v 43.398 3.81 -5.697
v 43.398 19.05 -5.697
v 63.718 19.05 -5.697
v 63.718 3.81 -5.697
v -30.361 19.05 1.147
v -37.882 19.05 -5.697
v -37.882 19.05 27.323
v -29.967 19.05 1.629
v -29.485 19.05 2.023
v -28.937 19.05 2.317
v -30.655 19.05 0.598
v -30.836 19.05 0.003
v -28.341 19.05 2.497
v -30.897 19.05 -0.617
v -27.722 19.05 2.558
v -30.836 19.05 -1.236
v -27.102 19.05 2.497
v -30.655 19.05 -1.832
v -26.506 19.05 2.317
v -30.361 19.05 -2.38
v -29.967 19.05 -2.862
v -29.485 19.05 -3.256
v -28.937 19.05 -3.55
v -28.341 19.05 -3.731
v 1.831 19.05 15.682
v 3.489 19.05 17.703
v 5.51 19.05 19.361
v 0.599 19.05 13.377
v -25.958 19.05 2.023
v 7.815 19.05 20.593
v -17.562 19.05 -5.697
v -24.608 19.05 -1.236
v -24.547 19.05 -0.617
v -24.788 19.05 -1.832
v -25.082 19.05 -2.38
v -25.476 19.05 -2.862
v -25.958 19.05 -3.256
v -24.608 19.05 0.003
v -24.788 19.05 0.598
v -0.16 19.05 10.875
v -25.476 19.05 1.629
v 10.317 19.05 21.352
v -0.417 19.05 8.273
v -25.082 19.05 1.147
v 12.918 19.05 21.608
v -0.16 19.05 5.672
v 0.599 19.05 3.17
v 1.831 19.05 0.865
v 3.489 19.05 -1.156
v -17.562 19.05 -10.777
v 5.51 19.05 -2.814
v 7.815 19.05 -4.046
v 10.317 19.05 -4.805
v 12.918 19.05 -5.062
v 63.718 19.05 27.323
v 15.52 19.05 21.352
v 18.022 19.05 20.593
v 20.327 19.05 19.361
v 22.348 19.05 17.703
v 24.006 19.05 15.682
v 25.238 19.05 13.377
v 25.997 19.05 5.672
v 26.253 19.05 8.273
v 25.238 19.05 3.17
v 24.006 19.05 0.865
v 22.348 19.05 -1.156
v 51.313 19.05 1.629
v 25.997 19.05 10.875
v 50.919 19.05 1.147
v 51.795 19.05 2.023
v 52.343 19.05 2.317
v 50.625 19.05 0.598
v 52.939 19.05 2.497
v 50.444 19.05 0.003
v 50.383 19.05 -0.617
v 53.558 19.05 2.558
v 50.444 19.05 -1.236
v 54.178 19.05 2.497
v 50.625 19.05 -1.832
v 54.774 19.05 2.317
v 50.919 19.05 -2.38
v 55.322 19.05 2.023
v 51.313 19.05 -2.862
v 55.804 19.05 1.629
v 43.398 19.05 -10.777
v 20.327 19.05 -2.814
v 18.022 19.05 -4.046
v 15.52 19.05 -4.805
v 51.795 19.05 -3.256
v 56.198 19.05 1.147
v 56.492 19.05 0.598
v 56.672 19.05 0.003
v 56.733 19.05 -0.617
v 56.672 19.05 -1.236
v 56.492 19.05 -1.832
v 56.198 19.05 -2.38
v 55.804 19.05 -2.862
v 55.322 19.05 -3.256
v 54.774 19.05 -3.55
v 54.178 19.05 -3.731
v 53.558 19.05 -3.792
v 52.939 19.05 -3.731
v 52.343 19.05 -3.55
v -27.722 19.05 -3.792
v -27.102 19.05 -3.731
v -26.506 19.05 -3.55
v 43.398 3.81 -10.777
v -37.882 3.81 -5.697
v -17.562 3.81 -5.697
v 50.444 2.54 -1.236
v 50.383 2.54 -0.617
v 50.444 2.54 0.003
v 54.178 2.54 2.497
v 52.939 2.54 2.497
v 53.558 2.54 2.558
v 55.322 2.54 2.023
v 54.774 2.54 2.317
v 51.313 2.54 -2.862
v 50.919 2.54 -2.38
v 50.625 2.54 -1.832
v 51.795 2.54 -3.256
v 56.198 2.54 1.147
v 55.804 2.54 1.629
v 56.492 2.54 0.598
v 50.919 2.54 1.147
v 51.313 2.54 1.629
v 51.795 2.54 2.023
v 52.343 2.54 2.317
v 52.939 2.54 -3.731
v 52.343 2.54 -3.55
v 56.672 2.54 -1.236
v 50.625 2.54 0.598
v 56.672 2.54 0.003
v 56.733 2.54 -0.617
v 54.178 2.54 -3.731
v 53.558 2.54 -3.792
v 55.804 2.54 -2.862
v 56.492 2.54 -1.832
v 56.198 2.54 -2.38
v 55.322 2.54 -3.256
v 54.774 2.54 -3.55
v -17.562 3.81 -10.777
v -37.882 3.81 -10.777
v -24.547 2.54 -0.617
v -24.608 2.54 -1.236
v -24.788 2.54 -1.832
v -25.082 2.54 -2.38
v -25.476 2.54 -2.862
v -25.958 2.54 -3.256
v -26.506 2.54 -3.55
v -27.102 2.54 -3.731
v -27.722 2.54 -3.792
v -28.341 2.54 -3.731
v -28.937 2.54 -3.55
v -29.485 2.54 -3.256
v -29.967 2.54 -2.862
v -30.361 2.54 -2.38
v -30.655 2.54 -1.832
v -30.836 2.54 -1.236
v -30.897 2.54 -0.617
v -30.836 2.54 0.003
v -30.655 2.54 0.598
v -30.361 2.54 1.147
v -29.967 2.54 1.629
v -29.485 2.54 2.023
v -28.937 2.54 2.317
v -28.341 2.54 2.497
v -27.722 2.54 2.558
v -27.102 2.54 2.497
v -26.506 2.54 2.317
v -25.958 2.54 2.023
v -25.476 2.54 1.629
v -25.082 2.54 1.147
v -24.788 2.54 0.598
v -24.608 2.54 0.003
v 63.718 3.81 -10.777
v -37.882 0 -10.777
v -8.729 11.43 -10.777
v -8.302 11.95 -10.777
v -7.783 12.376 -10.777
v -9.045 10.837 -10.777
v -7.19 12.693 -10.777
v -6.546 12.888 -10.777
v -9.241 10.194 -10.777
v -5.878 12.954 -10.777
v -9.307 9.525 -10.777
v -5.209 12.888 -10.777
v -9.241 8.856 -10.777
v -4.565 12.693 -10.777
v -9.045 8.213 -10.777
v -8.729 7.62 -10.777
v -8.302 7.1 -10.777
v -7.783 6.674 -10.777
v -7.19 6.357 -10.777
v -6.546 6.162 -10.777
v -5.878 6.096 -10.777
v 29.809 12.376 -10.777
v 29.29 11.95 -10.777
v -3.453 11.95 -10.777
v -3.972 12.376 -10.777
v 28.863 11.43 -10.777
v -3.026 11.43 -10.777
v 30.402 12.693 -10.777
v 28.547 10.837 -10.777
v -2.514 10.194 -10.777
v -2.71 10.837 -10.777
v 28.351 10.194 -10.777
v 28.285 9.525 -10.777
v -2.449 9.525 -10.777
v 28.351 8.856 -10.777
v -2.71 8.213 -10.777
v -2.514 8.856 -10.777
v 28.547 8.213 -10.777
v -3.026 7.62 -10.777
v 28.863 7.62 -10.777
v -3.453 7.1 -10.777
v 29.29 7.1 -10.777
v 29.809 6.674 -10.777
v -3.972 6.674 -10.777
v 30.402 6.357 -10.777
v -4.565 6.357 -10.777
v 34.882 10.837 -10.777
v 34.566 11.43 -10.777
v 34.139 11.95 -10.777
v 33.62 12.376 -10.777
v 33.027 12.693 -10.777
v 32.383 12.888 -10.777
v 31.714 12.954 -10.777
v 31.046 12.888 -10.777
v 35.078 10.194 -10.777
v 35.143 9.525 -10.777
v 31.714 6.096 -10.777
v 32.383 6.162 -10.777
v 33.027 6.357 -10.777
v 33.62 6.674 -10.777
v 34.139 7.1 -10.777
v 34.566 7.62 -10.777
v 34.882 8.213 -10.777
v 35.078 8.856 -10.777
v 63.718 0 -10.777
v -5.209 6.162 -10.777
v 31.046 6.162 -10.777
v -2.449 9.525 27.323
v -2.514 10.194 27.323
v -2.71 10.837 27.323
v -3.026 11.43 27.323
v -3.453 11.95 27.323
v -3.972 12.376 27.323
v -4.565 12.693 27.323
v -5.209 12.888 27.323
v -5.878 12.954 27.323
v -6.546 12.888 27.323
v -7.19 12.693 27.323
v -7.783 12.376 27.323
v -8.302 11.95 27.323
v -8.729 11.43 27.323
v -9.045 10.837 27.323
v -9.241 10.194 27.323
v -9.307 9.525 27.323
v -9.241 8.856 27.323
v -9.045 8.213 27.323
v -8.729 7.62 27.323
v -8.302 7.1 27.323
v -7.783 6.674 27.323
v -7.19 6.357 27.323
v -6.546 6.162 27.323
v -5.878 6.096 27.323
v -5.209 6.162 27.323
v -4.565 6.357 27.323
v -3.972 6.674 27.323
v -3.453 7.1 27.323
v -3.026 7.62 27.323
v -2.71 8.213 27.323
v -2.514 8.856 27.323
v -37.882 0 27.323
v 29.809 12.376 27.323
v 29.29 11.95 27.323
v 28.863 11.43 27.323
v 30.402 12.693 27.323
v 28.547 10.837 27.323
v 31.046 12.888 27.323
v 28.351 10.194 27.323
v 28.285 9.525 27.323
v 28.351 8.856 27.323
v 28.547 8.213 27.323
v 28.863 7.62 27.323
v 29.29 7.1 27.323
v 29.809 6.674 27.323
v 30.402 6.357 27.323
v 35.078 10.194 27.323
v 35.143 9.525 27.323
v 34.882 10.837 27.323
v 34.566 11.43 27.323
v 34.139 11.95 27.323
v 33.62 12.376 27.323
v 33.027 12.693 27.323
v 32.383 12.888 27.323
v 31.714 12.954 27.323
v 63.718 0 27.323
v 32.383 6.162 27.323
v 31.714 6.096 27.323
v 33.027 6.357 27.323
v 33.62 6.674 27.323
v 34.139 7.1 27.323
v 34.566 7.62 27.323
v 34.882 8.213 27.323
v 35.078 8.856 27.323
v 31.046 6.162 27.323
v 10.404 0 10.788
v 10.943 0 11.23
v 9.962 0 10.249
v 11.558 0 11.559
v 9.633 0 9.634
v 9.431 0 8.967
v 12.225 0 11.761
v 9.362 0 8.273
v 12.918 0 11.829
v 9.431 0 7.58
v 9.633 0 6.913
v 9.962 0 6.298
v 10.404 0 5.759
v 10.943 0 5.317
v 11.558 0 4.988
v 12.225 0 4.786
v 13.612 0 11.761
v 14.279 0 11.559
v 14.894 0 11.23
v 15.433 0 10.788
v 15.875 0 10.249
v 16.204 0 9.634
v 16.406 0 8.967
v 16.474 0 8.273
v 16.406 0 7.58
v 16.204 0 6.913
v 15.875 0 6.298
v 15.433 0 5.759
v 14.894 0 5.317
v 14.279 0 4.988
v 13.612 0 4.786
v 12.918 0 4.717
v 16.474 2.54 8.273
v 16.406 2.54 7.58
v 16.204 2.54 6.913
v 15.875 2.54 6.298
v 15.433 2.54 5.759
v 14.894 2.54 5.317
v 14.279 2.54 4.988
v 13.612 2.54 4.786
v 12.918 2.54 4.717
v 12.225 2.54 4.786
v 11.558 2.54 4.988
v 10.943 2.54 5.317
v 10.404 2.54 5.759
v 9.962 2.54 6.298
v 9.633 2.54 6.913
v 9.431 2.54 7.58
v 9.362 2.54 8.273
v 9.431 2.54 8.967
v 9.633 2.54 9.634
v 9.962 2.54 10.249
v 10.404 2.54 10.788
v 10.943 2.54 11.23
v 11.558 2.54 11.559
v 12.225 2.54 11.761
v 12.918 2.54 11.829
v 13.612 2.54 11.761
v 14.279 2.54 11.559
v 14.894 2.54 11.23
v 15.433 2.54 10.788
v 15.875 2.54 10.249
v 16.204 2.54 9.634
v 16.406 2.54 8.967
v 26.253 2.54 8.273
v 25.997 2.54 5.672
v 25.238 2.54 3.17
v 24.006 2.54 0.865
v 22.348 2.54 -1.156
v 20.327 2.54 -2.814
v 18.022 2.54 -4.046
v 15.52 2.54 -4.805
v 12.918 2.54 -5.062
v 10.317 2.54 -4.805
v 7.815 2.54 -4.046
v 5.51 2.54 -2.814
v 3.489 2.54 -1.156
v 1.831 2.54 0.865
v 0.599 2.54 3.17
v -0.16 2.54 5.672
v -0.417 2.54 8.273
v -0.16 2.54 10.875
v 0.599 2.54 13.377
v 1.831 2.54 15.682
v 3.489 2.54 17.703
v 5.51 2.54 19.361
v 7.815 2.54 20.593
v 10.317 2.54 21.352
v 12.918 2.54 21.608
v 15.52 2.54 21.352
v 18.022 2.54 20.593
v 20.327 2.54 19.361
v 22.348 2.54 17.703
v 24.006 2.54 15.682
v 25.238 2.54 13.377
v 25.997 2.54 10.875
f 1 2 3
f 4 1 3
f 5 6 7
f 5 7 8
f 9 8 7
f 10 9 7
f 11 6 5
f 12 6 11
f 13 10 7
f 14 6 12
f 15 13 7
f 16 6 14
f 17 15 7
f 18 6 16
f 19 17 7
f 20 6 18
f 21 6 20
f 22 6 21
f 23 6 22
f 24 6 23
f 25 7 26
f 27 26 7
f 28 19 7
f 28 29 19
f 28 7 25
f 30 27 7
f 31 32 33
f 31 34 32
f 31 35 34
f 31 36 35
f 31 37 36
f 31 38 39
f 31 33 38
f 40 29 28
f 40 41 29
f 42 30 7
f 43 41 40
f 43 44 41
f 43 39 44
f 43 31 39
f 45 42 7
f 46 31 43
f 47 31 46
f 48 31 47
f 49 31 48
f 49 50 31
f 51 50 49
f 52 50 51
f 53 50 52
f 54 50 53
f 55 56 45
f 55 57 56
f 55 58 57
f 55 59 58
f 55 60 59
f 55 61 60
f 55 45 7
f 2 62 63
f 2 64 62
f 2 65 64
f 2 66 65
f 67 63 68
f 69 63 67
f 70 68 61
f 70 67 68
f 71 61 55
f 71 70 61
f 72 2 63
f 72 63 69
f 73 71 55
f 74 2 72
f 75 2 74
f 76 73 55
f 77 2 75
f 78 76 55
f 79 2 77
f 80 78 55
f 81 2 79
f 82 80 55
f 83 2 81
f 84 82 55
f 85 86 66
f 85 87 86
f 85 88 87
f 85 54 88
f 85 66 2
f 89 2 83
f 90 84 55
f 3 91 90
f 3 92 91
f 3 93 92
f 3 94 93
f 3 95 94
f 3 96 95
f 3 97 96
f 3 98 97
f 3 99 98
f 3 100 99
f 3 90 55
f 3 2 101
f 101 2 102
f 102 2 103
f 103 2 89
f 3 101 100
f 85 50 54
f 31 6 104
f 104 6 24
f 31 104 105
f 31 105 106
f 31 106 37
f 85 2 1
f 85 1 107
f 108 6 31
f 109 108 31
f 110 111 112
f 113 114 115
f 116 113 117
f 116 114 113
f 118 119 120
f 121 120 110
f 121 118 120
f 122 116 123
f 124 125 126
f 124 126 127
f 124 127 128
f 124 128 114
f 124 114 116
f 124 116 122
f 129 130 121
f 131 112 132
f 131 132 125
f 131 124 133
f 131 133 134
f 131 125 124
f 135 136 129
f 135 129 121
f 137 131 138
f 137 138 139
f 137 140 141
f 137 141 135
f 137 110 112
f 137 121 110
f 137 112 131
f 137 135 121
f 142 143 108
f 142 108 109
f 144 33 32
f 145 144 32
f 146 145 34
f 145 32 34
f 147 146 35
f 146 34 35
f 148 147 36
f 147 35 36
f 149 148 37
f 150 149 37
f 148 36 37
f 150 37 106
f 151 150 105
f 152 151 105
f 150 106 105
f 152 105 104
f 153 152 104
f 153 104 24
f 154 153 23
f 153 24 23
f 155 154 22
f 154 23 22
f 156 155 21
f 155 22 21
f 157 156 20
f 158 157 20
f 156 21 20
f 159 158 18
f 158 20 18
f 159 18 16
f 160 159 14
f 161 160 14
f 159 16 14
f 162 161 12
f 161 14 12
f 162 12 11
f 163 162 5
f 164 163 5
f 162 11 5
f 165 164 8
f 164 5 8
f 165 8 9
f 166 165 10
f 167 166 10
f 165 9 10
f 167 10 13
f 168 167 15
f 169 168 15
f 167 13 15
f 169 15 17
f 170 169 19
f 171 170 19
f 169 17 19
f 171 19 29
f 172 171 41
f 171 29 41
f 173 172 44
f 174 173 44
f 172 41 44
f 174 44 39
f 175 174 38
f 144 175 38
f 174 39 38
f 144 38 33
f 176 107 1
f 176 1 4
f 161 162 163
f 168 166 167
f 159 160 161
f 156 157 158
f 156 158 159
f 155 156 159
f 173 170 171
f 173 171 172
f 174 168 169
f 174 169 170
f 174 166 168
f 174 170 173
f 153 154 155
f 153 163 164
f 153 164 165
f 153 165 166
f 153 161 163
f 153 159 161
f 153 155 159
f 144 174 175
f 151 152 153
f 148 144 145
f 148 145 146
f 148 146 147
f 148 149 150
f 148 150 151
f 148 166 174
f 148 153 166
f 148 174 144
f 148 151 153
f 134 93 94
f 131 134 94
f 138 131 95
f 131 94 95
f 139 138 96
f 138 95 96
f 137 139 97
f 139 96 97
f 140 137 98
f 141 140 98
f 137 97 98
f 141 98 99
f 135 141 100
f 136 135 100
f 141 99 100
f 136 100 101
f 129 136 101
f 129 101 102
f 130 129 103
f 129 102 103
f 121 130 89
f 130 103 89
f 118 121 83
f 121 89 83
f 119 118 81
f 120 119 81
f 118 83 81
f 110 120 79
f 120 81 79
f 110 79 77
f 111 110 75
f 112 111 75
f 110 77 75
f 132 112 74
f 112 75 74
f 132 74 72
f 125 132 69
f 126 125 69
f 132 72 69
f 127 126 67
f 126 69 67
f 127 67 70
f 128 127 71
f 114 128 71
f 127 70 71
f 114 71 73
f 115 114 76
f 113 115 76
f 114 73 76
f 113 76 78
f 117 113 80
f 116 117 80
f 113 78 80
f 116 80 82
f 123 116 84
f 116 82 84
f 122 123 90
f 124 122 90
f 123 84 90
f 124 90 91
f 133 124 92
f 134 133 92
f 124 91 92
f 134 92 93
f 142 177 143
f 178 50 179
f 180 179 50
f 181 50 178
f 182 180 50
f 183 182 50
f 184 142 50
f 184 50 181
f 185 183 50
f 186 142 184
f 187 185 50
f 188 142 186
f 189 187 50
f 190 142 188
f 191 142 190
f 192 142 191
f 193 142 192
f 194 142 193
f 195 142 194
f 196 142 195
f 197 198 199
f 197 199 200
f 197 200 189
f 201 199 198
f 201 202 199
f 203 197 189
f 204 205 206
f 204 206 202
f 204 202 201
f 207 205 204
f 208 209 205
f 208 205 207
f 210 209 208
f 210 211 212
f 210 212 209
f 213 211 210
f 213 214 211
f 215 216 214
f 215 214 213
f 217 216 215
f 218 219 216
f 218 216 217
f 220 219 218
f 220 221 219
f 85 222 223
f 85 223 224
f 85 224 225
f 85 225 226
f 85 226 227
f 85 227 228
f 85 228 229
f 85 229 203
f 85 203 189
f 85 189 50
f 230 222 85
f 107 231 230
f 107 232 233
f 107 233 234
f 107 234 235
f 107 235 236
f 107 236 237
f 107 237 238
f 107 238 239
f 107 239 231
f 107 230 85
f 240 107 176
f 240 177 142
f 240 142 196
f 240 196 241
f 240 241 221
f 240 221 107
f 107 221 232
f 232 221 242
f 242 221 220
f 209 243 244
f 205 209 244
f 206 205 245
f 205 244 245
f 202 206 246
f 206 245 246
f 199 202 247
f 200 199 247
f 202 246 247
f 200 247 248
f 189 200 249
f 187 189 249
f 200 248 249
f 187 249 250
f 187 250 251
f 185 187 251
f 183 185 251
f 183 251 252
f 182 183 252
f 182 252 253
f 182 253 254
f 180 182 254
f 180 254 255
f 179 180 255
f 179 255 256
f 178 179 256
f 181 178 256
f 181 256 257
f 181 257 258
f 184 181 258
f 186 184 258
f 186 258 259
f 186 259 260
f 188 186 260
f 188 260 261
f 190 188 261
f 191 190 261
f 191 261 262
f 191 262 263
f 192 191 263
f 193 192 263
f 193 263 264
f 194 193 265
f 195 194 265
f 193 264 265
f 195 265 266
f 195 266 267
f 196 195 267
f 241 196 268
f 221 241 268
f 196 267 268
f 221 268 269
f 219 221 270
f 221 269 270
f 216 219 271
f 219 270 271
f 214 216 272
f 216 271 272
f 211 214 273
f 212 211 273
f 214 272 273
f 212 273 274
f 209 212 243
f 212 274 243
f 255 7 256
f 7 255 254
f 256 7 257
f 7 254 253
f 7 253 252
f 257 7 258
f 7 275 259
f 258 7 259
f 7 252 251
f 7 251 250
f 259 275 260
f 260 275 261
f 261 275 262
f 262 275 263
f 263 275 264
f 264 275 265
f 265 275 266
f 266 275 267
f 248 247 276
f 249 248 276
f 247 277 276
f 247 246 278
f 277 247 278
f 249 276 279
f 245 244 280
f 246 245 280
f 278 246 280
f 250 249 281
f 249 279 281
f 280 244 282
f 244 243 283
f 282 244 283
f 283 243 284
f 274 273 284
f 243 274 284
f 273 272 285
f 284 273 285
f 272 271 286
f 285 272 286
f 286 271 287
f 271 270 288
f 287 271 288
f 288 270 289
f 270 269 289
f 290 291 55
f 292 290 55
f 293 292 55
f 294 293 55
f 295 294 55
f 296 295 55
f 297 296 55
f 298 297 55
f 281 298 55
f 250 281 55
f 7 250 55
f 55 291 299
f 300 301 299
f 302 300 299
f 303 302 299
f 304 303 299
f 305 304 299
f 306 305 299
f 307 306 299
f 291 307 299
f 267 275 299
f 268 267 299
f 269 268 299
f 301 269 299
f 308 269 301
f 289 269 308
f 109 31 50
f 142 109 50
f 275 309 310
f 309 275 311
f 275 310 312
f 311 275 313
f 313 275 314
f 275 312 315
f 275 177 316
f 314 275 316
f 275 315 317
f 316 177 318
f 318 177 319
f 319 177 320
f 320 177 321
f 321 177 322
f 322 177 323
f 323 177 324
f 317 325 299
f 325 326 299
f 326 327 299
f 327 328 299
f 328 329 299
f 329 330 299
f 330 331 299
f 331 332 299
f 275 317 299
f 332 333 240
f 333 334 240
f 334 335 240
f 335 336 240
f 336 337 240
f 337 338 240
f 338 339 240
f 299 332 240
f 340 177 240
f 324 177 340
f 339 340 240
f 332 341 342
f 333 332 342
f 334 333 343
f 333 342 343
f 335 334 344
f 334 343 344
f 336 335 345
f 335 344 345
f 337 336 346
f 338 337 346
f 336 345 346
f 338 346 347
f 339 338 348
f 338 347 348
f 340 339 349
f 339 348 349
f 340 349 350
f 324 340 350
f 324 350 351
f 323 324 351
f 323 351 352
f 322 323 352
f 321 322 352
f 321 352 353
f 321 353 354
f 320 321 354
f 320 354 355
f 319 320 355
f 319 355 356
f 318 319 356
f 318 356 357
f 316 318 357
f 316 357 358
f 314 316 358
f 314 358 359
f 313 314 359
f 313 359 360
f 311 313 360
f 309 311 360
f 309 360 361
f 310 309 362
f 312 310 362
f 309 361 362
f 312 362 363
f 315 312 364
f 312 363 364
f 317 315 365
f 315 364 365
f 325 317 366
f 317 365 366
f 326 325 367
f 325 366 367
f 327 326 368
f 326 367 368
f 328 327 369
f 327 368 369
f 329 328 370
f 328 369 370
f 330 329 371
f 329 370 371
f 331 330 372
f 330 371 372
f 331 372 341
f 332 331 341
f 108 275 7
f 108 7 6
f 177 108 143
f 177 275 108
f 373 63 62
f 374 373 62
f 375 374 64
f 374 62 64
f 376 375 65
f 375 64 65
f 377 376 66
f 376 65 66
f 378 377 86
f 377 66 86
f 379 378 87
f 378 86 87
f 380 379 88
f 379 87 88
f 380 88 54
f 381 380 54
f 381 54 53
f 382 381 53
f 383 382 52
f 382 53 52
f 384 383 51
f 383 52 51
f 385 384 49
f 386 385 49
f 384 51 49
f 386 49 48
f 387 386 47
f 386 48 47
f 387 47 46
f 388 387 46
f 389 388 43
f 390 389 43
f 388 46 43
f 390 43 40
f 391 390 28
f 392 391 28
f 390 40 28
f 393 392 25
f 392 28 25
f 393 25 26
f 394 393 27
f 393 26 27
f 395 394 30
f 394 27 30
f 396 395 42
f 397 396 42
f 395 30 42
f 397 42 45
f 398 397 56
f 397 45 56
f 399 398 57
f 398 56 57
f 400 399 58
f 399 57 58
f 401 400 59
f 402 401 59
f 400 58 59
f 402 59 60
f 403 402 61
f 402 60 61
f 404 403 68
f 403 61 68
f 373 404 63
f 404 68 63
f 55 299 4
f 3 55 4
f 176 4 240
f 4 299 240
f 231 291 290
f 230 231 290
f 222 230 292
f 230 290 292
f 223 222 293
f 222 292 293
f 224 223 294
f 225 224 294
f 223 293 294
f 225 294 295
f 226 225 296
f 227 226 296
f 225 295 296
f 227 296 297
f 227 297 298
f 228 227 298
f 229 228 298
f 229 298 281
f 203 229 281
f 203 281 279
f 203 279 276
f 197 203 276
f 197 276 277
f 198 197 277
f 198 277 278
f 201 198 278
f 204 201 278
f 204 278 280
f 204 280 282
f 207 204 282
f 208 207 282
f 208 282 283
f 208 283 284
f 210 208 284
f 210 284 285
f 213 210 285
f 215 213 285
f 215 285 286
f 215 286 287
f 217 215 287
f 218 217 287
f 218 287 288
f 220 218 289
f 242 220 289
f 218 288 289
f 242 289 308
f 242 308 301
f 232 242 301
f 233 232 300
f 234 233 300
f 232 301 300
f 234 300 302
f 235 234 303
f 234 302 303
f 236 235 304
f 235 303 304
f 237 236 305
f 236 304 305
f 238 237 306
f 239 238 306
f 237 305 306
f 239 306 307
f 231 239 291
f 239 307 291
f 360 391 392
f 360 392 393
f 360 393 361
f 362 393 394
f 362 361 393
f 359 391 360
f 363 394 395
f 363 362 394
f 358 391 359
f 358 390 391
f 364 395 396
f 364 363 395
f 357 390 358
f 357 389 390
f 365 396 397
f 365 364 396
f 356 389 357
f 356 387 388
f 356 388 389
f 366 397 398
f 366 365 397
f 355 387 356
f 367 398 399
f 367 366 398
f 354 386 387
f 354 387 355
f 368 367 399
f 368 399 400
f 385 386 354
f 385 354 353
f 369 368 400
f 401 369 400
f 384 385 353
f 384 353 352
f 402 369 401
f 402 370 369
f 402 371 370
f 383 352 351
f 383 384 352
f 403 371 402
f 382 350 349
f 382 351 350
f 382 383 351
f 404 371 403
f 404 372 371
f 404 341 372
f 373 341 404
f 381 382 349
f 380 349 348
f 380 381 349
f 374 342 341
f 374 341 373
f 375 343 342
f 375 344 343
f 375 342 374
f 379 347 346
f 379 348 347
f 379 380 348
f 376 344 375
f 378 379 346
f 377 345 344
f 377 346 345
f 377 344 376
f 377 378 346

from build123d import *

# Parameters (mm, degrees)
SKETCH1_W           = 101.6
SKETCH1_H           = 38.1
BOSS_EXTRUDE1_DEPTH = 19.05
SKETCH2_R           = 3.175
CUT_EXTRUDE1_DEPTH  = 16.51
CUT_EXTRUDE2_REACH  = 40.1
SKETCH3_R           = 3.429
SKETCH4_R           = 13.335
CUT_EXTRUDE3_DEPTH  = 16.51
SKETCH5_R           = 3.556
CUT_EXTRUDE4_DEPTH  = 20.05
SKETCH6_W           = 20.32
SKETCH6_H           = 5.08
CUT_EXTRUDE5_DEPTH  = 15.24


with BuildPart() as part:
    # Sketch1 → Boss-Extrude1 (new body)
    with BuildSketch(Plane(origin=(0, 0, 0), x_dir=(1, 0, 0), z_dir=(0, 1, 0))):
        with Locations((12.918491372, -8.273443983)):
            Rectangle(SKETCH1_W, SKETCH1_H)
    extrude(amount=BOSS_EXTRUDE1_DEPTH)

    # Sketch2 → Cut-Extrude1 (cut)
    with BuildSketch(Plane(origin=(0, 19.05, 0), x_dir=(1, 0, 0), z_dir=(0, 1, 0))):
        with Locations((-27.721508628, 0.616556017)):
            Circle(SKETCH2_R)
        with Locations((53.558491372, 0.616556017)):
            Circle(SKETCH2_R)
    extrude(amount=-CUT_EXTRUDE1_DEPTH, mode=Mode.SUBTRACT)

    # Sketch3 → Cut-Extrude2 (cut, up to next)
    with BuildSketch(Plane.XY.offset(27.323443983), mode=Mode.PRIVATE) as cut_extrude2_sk1:
        with Locations((-5.877508628, 9.525)):
            Circle(SKETCH3_R)
    cut_extrude2_tool1 = extrude(cut_extrude2_sk1.sketch, amount=-CUT_EXTRUDE2_REACH, mode=Mode.PRIVATE) & part.part
    add(cut_extrude2_tool1.solids().sort_by_distance((-5.877509, 9.525, 27.323444))[0], mode=Mode.SUBTRACT)
    # Sketch3 → Cut-Extrude2 (cut, up to next)
    with BuildSketch(Plane.XY.offset(27.323443983), mode=Mode.PRIVATE) as cut_extrude2_sk2:
        with Locations((31.714491372, 9.525)):
            Circle(SKETCH3_R)
    cut_extrude2_tool2 = extrude(cut_extrude2_sk2.sketch, amount=-CUT_EXTRUDE2_REACH, mode=Mode.PRIVATE) & part.part
    add(cut_extrude2_tool2.solids().sort_by_distance((31.714491, 9.525, 27.323444))[0], mode=Mode.SUBTRACT)

    # Sketch4 → Cut-Extrude3 (cut)
    with BuildSketch(Plane(origin=(0, 19.05, 0), x_dir=(1, 0, 0), z_dir=(0, 1, 0))):
        with Locations((12.918491372, -8.273443983)):
            Circle(SKETCH4_R)
    extrude(amount=-CUT_EXTRUDE3_DEPTH, mode=Mode.SUBTRACT)

    # Sketch5 → Cut-Extrude4 (cut, through all)
    with BuildSketch(Plane(origin=(0, 19.05, 0), x_dir=(1, 0, 0), z_dir=(0, 1, 0))):
        with Locations((12.918491372, -8.273443983)):
            Circle(SKETCH5_R)
    extrude(amount=-CUT_EXTRUDE4_DEPTH, mode=Mode.SUBTRACT)

    # Sketch6 → Cut-Extrude5 (cut)
    with BuildSketch(Plane(origin=(0, 19.05, 0), x_dir=(1, 0, 0), z_dir=(0, 1, 0))):
        with Locations((-27.721508628, 8.236556017)):
            Rectangle(SKETCH6_W, SKETCH6_H)
        with Locations((53.558491372, 8.236556017)):
            Rectangle(SKETCH6_W, SKETCH6_H)
    extrude(amount=-CUT_EXTRUDE5_DEPTH, mode=Mode.SUBTRACT)


solid = part.part
